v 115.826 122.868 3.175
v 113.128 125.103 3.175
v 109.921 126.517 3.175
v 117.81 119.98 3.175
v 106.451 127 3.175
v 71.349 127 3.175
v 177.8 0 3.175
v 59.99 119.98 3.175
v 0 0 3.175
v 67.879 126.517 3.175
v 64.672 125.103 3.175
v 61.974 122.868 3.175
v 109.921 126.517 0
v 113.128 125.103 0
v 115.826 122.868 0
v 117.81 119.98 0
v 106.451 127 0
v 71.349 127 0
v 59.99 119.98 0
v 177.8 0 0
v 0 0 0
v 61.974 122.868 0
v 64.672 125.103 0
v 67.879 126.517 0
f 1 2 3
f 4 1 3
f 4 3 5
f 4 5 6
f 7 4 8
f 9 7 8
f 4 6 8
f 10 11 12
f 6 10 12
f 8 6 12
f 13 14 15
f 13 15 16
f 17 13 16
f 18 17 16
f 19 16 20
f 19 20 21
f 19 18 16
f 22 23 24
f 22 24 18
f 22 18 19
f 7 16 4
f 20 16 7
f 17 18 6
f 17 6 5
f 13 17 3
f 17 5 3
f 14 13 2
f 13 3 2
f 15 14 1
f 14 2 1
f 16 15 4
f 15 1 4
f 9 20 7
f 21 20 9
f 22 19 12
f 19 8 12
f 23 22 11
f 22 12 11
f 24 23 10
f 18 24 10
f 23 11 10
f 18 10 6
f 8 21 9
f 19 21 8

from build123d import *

# Parameters (mm, degrees)
MAINSHAPE_DEPTH = 3.175
FILLET1_R       = 12.7


with BuildPart() as part:
    # Sketch1 → MainShape (new body)
    with BuildSketch(Plane.XY):
        Polygon((0, 0), (63.5, 127), (114.3, 127), (177.8, 0), align=None)
    extrude(amount=MAINSHAPE_DEPTH)

    # Fillet1
    fillet1_edges = [part.edges().sort_by_distance(p)[0] for p in [
        (63.5, 127, 1.5875),
        (114.3, 127, 1.5875),
    ]]
    fillet(fillet1_edges, radius=FILLET1_R)


solid = part.part
